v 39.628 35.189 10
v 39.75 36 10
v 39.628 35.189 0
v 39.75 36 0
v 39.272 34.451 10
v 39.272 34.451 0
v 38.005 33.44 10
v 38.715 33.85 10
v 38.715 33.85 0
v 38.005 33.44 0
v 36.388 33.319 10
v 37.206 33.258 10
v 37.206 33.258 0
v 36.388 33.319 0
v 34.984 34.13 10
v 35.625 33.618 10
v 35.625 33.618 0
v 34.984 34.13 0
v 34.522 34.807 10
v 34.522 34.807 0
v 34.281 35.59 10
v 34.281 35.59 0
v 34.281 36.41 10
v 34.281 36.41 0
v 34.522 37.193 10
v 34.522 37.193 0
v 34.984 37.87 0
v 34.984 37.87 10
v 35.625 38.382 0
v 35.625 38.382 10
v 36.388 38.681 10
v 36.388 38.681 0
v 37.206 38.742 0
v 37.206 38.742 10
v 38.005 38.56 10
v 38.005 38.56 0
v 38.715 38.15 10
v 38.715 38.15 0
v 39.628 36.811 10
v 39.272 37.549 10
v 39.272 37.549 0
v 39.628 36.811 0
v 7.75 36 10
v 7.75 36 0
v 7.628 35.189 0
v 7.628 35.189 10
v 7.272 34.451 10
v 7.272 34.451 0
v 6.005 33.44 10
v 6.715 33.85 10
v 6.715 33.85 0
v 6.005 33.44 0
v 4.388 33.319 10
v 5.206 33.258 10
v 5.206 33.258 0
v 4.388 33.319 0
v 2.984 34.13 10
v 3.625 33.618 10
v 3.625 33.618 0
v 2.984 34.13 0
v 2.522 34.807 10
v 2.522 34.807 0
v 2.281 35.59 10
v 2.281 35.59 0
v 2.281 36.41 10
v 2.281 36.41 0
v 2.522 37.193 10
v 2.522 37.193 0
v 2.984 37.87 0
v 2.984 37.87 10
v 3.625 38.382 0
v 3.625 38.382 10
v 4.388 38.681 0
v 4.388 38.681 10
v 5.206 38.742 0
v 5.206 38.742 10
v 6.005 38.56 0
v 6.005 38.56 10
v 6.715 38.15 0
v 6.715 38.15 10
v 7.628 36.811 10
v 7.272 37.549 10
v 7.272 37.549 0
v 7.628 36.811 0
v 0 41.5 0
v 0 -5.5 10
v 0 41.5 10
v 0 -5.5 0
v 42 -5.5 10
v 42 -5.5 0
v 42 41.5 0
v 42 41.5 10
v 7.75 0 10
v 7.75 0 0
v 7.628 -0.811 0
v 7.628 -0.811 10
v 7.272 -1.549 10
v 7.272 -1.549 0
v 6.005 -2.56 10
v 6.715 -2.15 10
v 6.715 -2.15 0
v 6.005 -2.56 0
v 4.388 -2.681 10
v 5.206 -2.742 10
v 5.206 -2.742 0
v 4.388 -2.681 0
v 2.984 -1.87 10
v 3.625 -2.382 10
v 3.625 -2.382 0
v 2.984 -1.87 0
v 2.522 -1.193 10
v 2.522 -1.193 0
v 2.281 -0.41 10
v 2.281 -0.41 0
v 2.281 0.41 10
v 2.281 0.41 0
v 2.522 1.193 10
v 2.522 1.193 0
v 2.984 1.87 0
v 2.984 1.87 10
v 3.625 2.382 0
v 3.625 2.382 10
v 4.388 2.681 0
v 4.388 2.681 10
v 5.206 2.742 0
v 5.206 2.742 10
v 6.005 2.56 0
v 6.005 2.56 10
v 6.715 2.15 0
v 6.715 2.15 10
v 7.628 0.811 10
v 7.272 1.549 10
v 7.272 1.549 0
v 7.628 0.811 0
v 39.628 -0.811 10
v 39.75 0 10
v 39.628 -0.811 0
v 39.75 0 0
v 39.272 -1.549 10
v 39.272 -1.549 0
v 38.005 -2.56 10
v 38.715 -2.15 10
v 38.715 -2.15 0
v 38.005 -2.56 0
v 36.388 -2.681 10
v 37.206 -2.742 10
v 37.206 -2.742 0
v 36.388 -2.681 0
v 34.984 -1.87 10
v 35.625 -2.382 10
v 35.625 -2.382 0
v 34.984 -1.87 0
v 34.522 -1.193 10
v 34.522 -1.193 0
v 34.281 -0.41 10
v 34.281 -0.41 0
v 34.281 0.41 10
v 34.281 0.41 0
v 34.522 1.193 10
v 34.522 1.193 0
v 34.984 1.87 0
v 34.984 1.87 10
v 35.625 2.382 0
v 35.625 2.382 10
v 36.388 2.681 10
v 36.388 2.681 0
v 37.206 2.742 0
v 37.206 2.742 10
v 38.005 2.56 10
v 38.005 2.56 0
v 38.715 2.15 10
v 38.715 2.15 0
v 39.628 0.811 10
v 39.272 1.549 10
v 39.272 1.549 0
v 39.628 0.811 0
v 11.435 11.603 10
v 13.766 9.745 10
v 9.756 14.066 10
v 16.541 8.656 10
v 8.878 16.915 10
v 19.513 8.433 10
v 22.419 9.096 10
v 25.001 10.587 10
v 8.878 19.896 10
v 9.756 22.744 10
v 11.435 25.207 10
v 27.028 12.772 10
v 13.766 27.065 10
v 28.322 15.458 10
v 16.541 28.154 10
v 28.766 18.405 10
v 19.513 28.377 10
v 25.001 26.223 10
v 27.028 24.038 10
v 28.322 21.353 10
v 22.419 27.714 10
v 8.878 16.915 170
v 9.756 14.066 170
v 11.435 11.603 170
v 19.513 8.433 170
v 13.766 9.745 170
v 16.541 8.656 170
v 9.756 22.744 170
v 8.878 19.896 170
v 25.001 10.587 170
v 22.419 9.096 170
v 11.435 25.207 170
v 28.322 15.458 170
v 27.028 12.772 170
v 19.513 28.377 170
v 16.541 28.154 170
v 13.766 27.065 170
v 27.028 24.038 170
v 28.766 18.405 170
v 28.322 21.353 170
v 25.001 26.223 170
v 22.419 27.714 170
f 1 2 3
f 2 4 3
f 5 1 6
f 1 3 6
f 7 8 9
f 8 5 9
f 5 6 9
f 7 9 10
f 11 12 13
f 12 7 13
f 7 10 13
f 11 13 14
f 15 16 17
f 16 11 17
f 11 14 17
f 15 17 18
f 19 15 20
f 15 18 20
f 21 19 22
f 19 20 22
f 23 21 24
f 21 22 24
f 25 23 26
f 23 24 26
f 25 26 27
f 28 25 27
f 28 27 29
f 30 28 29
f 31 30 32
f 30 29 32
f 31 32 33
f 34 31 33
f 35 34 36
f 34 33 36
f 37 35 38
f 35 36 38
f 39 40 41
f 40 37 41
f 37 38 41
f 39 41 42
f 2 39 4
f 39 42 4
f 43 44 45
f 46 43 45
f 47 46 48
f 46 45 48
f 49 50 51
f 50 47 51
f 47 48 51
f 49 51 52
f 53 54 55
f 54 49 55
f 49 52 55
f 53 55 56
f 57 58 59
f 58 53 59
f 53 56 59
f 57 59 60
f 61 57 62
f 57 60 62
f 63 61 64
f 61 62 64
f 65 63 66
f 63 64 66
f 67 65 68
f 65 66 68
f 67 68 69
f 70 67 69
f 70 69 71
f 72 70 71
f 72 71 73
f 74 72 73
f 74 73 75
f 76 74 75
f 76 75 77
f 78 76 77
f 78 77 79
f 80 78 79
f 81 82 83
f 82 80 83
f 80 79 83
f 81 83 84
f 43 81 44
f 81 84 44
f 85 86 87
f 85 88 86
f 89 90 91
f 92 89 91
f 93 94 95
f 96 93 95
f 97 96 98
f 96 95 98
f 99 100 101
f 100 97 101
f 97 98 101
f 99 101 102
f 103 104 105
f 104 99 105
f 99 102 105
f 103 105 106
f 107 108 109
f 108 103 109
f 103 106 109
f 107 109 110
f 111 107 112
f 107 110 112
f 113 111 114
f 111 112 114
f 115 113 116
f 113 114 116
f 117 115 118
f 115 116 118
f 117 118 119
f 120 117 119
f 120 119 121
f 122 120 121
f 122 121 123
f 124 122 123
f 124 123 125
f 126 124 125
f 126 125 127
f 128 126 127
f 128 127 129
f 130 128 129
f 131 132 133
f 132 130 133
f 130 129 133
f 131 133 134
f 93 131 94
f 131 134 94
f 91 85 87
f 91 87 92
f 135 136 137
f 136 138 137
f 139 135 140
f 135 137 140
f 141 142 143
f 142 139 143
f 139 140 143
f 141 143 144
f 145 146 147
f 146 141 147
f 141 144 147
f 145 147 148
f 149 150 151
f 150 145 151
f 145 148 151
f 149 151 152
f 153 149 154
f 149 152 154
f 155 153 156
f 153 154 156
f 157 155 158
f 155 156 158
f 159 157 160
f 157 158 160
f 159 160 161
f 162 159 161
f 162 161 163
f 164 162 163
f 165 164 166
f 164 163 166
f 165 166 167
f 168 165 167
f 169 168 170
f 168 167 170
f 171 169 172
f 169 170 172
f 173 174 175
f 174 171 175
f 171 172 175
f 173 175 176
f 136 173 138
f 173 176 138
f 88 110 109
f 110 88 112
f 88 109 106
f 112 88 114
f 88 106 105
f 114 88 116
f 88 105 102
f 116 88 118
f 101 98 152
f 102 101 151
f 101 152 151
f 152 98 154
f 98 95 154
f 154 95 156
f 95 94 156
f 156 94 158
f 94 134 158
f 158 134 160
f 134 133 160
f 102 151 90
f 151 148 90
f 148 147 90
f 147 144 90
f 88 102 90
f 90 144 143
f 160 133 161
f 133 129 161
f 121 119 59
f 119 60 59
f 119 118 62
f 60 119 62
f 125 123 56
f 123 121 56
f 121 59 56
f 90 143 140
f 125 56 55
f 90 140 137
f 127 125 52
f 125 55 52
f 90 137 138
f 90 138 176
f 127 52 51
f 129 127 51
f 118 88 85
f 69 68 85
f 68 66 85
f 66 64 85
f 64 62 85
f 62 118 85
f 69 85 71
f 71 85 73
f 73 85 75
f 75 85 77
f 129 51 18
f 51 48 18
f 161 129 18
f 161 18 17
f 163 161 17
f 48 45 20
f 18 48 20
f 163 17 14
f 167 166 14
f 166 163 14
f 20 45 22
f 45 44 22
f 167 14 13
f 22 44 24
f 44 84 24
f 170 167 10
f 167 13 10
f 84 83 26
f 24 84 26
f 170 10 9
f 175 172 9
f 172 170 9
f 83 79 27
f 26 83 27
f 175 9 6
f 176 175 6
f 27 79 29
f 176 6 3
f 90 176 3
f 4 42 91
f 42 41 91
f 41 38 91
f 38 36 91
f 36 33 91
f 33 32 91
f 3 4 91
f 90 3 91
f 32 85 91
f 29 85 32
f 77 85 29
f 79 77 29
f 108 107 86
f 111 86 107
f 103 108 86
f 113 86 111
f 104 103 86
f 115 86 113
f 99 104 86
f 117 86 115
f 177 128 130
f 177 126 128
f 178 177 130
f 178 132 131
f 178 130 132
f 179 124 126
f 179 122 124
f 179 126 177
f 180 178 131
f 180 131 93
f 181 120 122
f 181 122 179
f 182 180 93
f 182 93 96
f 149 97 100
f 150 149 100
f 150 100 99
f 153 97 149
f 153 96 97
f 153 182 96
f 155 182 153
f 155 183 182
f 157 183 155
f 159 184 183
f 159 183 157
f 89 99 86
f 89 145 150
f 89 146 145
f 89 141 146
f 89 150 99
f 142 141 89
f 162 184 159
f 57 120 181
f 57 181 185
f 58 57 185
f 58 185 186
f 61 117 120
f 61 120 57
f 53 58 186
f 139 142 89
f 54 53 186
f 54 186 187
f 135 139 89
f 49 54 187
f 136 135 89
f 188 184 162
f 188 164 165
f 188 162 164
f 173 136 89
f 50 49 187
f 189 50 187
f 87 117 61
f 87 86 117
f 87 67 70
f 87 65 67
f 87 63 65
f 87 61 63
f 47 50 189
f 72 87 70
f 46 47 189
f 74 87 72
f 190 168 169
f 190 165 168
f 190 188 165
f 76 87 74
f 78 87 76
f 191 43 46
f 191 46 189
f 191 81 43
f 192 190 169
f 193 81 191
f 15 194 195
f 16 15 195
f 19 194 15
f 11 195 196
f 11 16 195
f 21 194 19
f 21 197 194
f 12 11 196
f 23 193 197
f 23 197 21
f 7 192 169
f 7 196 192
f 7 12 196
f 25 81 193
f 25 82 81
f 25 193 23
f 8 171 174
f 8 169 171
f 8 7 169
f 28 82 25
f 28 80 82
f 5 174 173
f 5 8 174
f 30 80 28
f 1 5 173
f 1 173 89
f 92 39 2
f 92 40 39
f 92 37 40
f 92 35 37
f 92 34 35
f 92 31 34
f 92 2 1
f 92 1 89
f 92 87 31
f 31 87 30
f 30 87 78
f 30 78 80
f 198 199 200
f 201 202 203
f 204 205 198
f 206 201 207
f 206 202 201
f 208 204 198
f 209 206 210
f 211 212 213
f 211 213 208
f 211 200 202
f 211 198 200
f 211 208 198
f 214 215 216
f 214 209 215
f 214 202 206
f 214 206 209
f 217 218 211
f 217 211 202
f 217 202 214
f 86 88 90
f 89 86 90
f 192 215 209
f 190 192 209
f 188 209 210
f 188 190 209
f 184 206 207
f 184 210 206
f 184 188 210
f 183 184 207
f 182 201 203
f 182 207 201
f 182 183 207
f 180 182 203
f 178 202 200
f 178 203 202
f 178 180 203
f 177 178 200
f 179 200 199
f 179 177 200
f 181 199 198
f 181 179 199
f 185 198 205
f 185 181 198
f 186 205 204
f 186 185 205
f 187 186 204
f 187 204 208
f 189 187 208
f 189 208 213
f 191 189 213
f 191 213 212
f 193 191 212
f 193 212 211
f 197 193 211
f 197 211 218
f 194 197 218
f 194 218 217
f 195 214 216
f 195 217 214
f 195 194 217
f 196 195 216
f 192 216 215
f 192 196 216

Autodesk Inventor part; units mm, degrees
ref_plane "YZ Plane" through (0, 0, 0) normal (1, 0, 0) x (0, 1, 0)
ref_plane "XZ Plane" through (0, 0, 0) normal (0, 1, 0) x (-1, 0, 0)
ref_plane "XY Plane" through (0, 0, 0) normal (0, 0, 1) x (1, 0, 0)
sketch "スケッチ1" plane through (0, 0, 0) normal (0, 0, 1) x (1, 0, 0)
  circle A0 centre (37, 36) radius 2.75 projected
  line L0 (42, 30.5) -> (42, 41.5) projected
  line L1 (28, 41.5) -> (42, 41.5) projected
  line L2 (28, 30.5) -> (28, 41.5) projected
  line L3 (42, 30.5) -> (28, 30.5) projected
  circle A1 centre (5, 36) radius 2.75 projected
  line L4 (14, 30.5) -> (14, 41.5) projected
  line L5 (0, 41.5) -> (14, 41.5) projected
  line L6 (0, 30.5) -> (0, 41.5) projected
  line L7 (14, 30.5) -> (0, 30.5) projected
  circle A2 centre (37, 0) radius 2.75 projected
  line L8 (42, -5.5) -> (42, 5.5) projected
  line L9 (28, 5.5) -> (42, 5.5) projected
  line L10 (28, -5.5) -> (28, 5.5) projected
  line L11 (42, -5.5) -> (28, -5.5) projected
  circle A3 centre (5, 0) radius 2.75 projected
  line L12 (14, -5.5) -> (14, 5.5) projected
  line L13 (0, 5.5) -> (14, 5.5) projected
  line L14 (0, -5.5) -> (0, 5.5) projected
  line L15 (14, -5.5) -> (0, -5.5) projected
  line L16 (0, -5.5) -> (42, -5.5)
  line L17 (42, -5.5) -> (42, 41.5)
  line L18 (42, 41.5) -> (0, 41.5)
  line L19 (0, 41.5) -> (0, -5.5)
  point P0 (0, 0)
extrude "押し出し1" add sketch "スケッチ1" along normal blind 10
sketch "スケッチ2" plane through (0, 0, 10) normal (0, 0, 1) x (1, 0, 0)
  circle A0 centre (18.766, 18.4051) radius 10
  point P0 (0, 0)
  dimension "d2" = 20
extrude "押し出し2" add sketch "スケッチ2" along normal blind 160
